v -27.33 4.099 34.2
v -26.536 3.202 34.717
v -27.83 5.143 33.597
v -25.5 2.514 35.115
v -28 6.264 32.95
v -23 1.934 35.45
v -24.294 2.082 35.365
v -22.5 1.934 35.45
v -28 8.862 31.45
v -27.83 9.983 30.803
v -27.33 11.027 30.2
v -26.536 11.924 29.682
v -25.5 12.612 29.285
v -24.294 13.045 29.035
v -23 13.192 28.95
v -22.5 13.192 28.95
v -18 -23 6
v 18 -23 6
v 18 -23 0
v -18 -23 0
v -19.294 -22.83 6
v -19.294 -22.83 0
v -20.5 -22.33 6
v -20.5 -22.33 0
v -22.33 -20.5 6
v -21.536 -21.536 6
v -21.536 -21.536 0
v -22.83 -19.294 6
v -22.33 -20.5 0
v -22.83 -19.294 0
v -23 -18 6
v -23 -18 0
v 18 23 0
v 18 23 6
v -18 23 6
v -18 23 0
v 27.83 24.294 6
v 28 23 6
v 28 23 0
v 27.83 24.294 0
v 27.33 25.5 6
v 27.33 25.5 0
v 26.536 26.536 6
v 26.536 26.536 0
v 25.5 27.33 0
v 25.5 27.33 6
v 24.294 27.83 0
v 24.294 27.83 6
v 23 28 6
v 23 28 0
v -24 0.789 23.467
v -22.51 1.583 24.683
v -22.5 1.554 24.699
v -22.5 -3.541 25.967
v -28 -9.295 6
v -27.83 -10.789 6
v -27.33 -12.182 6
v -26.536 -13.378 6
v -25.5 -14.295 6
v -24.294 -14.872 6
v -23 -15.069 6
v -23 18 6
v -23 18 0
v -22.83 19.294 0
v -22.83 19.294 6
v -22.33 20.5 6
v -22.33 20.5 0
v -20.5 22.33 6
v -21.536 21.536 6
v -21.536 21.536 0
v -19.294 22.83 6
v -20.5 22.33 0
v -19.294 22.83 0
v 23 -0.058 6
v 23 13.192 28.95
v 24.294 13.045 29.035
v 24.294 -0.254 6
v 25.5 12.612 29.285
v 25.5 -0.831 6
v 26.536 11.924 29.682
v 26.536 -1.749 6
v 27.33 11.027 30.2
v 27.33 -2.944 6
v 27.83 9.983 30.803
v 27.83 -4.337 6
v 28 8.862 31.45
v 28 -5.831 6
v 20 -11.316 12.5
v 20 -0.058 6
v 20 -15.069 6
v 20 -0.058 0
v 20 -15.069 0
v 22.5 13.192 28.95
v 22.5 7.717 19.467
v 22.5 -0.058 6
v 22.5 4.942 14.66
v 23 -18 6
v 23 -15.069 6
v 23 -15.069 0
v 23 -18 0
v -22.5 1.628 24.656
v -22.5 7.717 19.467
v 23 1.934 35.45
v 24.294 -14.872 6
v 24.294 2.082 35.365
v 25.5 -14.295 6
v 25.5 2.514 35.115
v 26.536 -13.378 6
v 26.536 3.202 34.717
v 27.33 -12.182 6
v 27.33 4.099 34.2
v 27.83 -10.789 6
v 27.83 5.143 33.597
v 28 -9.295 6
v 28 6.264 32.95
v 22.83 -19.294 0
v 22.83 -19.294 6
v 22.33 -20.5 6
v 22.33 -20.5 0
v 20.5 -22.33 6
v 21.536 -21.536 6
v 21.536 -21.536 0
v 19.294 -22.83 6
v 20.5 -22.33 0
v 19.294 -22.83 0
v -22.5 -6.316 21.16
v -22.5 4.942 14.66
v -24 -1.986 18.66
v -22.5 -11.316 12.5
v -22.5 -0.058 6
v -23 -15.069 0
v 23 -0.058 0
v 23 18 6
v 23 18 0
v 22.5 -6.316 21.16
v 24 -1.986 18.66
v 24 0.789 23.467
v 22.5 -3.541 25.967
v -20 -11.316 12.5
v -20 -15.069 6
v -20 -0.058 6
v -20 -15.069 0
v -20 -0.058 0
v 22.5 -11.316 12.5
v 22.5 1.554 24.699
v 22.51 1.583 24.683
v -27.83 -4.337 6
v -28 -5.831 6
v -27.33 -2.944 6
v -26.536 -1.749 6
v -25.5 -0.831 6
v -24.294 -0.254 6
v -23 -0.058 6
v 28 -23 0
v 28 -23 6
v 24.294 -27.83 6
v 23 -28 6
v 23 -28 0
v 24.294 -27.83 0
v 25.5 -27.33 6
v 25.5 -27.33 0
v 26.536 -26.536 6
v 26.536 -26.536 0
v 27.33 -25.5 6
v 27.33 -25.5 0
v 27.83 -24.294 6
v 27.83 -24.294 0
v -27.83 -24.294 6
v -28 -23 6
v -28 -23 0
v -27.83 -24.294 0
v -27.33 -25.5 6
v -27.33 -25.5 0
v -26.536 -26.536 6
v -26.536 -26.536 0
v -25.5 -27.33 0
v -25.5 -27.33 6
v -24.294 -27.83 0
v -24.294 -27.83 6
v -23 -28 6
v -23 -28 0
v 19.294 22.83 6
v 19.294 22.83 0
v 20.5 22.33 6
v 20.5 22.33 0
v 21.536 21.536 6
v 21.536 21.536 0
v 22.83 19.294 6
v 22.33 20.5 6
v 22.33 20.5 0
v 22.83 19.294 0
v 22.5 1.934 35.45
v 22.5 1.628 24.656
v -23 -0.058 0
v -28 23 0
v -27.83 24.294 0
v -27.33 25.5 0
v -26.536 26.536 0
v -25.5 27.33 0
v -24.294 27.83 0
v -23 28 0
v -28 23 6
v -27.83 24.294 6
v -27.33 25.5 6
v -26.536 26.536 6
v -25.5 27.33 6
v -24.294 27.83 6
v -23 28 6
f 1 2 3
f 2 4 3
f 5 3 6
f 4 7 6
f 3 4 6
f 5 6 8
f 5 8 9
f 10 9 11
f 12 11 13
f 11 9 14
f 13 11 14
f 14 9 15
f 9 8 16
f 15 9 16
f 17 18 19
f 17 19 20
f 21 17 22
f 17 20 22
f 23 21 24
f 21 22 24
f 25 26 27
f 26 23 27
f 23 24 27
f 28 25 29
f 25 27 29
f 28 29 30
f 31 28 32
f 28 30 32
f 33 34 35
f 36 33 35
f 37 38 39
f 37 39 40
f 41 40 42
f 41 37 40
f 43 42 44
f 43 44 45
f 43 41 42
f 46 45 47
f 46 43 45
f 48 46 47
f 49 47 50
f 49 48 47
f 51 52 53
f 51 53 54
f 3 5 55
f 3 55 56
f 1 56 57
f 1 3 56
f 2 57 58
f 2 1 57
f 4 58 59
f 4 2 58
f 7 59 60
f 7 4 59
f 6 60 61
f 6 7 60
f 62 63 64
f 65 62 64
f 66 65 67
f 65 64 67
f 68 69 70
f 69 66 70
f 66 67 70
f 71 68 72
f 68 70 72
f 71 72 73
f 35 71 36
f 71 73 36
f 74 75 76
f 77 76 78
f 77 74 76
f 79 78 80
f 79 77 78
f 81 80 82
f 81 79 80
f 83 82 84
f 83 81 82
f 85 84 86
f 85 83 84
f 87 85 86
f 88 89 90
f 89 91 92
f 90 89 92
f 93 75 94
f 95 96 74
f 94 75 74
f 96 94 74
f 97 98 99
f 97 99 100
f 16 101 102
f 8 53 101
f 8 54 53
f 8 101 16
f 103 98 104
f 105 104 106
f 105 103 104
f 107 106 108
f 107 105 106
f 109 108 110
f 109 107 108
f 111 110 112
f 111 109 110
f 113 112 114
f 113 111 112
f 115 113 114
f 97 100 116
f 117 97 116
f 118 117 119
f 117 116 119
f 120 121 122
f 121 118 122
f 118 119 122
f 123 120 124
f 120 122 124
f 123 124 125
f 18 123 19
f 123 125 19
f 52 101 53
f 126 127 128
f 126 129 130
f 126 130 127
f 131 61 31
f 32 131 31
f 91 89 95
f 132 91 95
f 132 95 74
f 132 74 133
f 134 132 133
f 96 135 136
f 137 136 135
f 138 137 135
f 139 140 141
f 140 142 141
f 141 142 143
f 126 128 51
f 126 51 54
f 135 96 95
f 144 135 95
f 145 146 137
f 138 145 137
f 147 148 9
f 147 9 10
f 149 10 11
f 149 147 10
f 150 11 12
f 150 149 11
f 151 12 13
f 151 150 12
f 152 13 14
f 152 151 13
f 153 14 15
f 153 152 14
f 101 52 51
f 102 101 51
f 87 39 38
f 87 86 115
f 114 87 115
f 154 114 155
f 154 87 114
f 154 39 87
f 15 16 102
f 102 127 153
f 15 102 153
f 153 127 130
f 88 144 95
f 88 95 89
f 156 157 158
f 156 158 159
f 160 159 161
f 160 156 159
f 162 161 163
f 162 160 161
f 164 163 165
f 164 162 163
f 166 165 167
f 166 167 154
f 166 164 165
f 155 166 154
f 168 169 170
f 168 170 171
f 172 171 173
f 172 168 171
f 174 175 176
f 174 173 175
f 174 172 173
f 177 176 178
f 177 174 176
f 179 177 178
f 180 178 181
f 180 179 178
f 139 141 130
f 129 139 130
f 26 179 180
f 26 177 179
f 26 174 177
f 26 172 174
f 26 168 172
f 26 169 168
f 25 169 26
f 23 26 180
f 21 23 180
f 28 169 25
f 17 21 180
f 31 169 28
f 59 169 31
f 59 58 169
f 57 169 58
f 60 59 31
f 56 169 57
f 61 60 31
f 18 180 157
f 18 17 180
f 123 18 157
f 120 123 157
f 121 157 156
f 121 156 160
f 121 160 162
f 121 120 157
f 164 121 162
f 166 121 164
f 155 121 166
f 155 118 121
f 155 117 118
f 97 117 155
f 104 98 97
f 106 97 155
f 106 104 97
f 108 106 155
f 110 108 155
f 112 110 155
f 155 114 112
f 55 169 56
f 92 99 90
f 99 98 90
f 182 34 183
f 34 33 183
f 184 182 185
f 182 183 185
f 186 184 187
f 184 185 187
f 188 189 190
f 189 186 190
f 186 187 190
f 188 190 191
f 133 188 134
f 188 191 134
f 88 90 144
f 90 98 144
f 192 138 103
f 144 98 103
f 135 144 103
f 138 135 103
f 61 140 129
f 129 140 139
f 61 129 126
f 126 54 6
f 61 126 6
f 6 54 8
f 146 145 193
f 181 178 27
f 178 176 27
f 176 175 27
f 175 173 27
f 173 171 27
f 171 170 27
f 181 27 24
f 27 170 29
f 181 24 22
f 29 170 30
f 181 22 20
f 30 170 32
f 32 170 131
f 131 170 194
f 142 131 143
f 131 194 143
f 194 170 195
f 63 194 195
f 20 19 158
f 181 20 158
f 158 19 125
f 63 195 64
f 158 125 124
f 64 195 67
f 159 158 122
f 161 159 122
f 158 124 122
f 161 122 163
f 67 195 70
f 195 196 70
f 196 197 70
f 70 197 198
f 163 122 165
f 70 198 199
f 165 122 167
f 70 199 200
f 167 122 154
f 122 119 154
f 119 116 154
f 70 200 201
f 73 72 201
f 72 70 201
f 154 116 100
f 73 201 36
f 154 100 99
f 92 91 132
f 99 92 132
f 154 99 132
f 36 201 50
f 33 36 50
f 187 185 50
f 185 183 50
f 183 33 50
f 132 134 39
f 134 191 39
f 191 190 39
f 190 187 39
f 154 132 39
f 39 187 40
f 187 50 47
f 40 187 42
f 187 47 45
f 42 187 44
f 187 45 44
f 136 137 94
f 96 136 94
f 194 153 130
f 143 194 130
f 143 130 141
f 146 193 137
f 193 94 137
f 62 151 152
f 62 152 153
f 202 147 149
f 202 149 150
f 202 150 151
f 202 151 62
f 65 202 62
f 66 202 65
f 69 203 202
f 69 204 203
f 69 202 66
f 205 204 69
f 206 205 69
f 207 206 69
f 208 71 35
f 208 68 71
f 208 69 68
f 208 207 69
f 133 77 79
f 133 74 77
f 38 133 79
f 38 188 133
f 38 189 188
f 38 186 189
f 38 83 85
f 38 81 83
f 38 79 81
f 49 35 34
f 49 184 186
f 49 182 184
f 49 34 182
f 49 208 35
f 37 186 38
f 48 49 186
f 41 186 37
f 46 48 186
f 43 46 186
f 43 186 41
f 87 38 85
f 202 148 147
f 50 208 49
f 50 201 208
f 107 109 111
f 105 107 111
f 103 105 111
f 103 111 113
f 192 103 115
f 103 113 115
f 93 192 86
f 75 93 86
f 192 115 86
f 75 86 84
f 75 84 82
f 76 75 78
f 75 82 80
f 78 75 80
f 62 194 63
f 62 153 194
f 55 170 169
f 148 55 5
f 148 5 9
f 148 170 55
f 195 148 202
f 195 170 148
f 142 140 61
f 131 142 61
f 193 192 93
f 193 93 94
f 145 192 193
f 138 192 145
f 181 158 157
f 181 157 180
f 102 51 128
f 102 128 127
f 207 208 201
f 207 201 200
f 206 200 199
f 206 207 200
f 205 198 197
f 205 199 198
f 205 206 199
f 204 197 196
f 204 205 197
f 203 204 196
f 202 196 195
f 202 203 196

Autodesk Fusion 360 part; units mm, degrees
sketch "Sketch1" plane through (0, 0, 0) normal (0, 0, 1) x (1, 0, 0)
  line L0 (28, -28) -> (-28, -28)
  line L1 (-28, -28) -> (-28, 28)
  line L2 (-28, 28) -> (28, 28)
  line L3 (28, 28) -> (28, -28)
  line L4 (28, -28) -> (-28, 28) construction
  line L5 (-28, -28) -> (28, 28) construction
  dimension "d1" = 56
  dimension "d2" = 56
extrude "Extrude1" add sketch "Sketch1" along normal blind 6
sketch "Sketch2" plane through (28, 0, 0) normal (1, 0, 0) x (0, 1, 0)
  line L0 (-28, 0) -> (28, 0)
  line L1 (28, 0) -> (28, 6)
  line L2 (28, 6) -> (-28, 6)
  line L3 (-28, 6) -> (-28, 0)
  line L4 (-15.0687, 6) -> (1.934, 35.4497)
  line L5 (1.934, 35.4497) -> (13.1924, 28.9497)
  line L6 (13.1924, 28.9497) -> (-0.0576, 6)
  line L7 (7.5632, 32.1997) -> (-7.5632, 6) construction
  line L8 (0, 19.0998) -> (0, 6) construction
  dimension "d5" = 60
  dimension "d6" = 26.5
  dimension "d13" = 13
extrude "Extrude2" add sketch "Sketch2" against normal up to surface (56 mm away) contours L2 L4 L5 L6
sketch "Sketch3" plane through (0, -13.8996, 8.025) normal (0, -0.866025, 0.5) x (1, 0, 0)
  line L0 (-28, 31.6673) -> (-28, -2.3382)
  line L1 (-28, -2.3382) -> (28, -2.3382)
  line L2 (28, -2.3382) -> (28, 31.6673)
  line L3 (28, 31.6673) -> (-28, 31.6673)
  line L4 (22.5, 31.6673) -> (22.5, 5.1673)
  line L5 (22.5, 5.1673) -> (0, 5.1673)
  line L6 (0, 5.1673) -> (-22.5, 5.1673)
  line L7 (-22.5, 5.1673) -> (-22.5, 31.6673)
  line L8 (0, -2.3382) -> (0, 5.1673) construction
  dimension "d9" = 45
  dimension "d10" = 26.5
extrude "Extrude3" cut sketch "Sketch3" against normal up to surface (13 mm away) contours L3 L4 L5 L6 L7
sketch "Sketch4" plane through (0, 15.8337, 27.4247) normal (0, 0.5, 0.866025) x (-1, 0, 0)
  line L0 (22.5, 16.0499) -> (22.5, 3.0499)
  line L1 (22.5, 3.0499) -> (28, 3.0499)
  line L2 (28, 3.0499) -> (28, 16.0499)
  line L3 (28, 16.0499) -> (22.5, 16.0499)
  line L4 (22.5, 11.0499) -> (24, 11.0499) construction
  line L5 (24, 11.0499) -> (22.5, 3.0499)
  line L6 (24, 11.0499) -> (22.5, 16.0499)
  line L7 (-24, 11.0499) -> (-22.5, 16.0499)
  line L8 (-24, 11.0499) -> (-22.5, 3.0499)
  line L9 (-22.5, 3.0499) -> (-22.5, 16.0499)
  line L10 (-22.5, 11.0499) -> (-24, 11.0499) construction
  line L11 (22.5, 9.5499) -> (-22.5, 9.5499) construction
  line L12 (22.5, 11.0499) -> (-22.5, 11.0499) construction
  point P0 (-22.5, 16.0499)
  point P1 (-22.5, 3.0499)
  dimension "d27" = 48
  dimension "d29" = 1.5
extrude "Extrude4" cut sketch "Sketch4" against normal up to surface (7 mm away) from surface at -9.5 contours L0 L5 L6 | L7 L8 L9
sketch "Sketch5" plane through (0, 0, 6) normal (0, 0, 1) x (-1, 0, 0)
  line L0 (28, -28) -> (28, 0.0576)
  line L1 (28, 0.0576) -> (22.5, 0.0576)
  line L2 (-28, 0.0576) -> (-28, -28)
  line L3 (-28, -28) -> (28, -28)
  line L4 (-23, 0.0576) -> (-23, -23)
  line L5 (-23, -23) -> (0, -23)
  line L6 (0, -23) -> (23, -23)
  line L7 (23, 0.0576) -> (23, -23)
  line L8 (0, 0) -> (0, -23) construction
  line L9 (-28, 15.0687) -> (28, 15.0687)
  line L10 (23, 0.0576) -> (23, 15.0687) construction
  line L11 (-23, 0.0576) -> (-23, 15.0687) construction
  line L12 (-23, 15.0687) -> (-23, 23)
  line L13 (-23, 23) -> (23, 23)
  line L14 (23, 15.0687) -> (23, 23)
  line L15 (-23, 23) -> (-23, 28) construction
  line L16 (28, 28) -> (-28, 28) construction
  line L17 (-23, -23) -> (-23, -28) construction
  line L18 (-23, -23) -> (-28, -23) construction
  line L19 (22.5, 0.0576) -> (-22.5, 0.0576)
  line L20 (-22.5, 0.0576) -> (-28, 0.0576)
  dimension "d24" = 5
extrude "Extrude5" cut sketch "Sketch5" against normal through all contours L1 L4 L5 L6 L7 L19 L20 | L9 L12 L13 L14
fillet "Fillet1" radius 5 8 edges at (28, 28, 3) (-28, 28, 3) (28, -28, 3) (-28, -28, 3) (23, 23, 3) (-23, 23, 3) (23, -23, 3) (-23, -23, 3)
fillet "Fillet2" radius 5 4 edges at (28, -6.5674, 20.7248) (28, 6.5674, 17.4748) (-28, -6.5674, 20.7248) (-28, 6.5674, 17.4748)
sketch "Sketch6" plane through (0, 0, 0) normal (0, 0, -1) x (1, 0, 0)
  arc A0 (-23, 28) -> (-28, 23) centre (-23, 23) ccw
  line L0 (-28, 23) -> (-28, -23)
  arc A1 (-28, -23) -> (-23, -28) centre (-23, -23) ccw
  line L1 (-23, -28) -> (23, -28)
  arc A2 (23, -28) -> (28, -23) centre (23, -23) ccw
  line L2 (28, -23) -> (28, 23)
  arc A3 (28, 23) -> (23, 28) centre (23, 23) ccw
  line L3 (23, 28) -> (-23, 28)
  line L4 (-23, -18) -> (-23, 0.0576)
  line L5 (-23, 0.0576) -> (23, 0.0576)
  line L6 (23, 0.0576) -> (23, -18)
  arc A4 (18, -23) -> (23, -18) centre (18, -18) ccw
  line L7 (18, -23) -> (-18, -23)
  arc A5 (-23, -18) -> (-18, -23) centre (-18, -18) ccw
  line L8 (23, 18) -> (23, 15.0687)
  line L9 (23, 15.0687) -> (-23, 15.0687)
  line L10 (-23, 15.0687) -> (-23, 18)
  arc A6 (-18, 23) -> (-23, 18) centre (-18, 18) ccw
  line L11 (-18, 23) -> (18, 23)
  arc A7 (23, 18) -> (18, 23) centre (18, 18) ccw
  line L12 (-23, 0.0576) -> (23, 0.0576)
  line L13 (23, 15.0687) -> (-23, 15.0687)
  line L14 (20, 0.0576) -> (20, 15.0687)
  line L15 (-20, 15.0687) -> (-20, 0.0576)
  line L16 (20, 7.5632) -> (0, 7.5632) construction
  line L17 (0, 7.5632) -> (0, 0) construction
  line L18 (0, 7.5632) -> (-20, 7.5632) construction
  dimension "d25" = 3
extrude "Extrude6" cut sketch "Sketch6" against normal through all contours L5 L9 L12 L13 L14 L15
chamfer "Chamfer1" distance 1.45 angle 45 4 edges at (23.25, 4.9783, 22.7224) (23.25, -0.6509, 25.9724) (-23.25, 4.9783, 22.7224) (-23.25, -0.6509, 25.9724)
